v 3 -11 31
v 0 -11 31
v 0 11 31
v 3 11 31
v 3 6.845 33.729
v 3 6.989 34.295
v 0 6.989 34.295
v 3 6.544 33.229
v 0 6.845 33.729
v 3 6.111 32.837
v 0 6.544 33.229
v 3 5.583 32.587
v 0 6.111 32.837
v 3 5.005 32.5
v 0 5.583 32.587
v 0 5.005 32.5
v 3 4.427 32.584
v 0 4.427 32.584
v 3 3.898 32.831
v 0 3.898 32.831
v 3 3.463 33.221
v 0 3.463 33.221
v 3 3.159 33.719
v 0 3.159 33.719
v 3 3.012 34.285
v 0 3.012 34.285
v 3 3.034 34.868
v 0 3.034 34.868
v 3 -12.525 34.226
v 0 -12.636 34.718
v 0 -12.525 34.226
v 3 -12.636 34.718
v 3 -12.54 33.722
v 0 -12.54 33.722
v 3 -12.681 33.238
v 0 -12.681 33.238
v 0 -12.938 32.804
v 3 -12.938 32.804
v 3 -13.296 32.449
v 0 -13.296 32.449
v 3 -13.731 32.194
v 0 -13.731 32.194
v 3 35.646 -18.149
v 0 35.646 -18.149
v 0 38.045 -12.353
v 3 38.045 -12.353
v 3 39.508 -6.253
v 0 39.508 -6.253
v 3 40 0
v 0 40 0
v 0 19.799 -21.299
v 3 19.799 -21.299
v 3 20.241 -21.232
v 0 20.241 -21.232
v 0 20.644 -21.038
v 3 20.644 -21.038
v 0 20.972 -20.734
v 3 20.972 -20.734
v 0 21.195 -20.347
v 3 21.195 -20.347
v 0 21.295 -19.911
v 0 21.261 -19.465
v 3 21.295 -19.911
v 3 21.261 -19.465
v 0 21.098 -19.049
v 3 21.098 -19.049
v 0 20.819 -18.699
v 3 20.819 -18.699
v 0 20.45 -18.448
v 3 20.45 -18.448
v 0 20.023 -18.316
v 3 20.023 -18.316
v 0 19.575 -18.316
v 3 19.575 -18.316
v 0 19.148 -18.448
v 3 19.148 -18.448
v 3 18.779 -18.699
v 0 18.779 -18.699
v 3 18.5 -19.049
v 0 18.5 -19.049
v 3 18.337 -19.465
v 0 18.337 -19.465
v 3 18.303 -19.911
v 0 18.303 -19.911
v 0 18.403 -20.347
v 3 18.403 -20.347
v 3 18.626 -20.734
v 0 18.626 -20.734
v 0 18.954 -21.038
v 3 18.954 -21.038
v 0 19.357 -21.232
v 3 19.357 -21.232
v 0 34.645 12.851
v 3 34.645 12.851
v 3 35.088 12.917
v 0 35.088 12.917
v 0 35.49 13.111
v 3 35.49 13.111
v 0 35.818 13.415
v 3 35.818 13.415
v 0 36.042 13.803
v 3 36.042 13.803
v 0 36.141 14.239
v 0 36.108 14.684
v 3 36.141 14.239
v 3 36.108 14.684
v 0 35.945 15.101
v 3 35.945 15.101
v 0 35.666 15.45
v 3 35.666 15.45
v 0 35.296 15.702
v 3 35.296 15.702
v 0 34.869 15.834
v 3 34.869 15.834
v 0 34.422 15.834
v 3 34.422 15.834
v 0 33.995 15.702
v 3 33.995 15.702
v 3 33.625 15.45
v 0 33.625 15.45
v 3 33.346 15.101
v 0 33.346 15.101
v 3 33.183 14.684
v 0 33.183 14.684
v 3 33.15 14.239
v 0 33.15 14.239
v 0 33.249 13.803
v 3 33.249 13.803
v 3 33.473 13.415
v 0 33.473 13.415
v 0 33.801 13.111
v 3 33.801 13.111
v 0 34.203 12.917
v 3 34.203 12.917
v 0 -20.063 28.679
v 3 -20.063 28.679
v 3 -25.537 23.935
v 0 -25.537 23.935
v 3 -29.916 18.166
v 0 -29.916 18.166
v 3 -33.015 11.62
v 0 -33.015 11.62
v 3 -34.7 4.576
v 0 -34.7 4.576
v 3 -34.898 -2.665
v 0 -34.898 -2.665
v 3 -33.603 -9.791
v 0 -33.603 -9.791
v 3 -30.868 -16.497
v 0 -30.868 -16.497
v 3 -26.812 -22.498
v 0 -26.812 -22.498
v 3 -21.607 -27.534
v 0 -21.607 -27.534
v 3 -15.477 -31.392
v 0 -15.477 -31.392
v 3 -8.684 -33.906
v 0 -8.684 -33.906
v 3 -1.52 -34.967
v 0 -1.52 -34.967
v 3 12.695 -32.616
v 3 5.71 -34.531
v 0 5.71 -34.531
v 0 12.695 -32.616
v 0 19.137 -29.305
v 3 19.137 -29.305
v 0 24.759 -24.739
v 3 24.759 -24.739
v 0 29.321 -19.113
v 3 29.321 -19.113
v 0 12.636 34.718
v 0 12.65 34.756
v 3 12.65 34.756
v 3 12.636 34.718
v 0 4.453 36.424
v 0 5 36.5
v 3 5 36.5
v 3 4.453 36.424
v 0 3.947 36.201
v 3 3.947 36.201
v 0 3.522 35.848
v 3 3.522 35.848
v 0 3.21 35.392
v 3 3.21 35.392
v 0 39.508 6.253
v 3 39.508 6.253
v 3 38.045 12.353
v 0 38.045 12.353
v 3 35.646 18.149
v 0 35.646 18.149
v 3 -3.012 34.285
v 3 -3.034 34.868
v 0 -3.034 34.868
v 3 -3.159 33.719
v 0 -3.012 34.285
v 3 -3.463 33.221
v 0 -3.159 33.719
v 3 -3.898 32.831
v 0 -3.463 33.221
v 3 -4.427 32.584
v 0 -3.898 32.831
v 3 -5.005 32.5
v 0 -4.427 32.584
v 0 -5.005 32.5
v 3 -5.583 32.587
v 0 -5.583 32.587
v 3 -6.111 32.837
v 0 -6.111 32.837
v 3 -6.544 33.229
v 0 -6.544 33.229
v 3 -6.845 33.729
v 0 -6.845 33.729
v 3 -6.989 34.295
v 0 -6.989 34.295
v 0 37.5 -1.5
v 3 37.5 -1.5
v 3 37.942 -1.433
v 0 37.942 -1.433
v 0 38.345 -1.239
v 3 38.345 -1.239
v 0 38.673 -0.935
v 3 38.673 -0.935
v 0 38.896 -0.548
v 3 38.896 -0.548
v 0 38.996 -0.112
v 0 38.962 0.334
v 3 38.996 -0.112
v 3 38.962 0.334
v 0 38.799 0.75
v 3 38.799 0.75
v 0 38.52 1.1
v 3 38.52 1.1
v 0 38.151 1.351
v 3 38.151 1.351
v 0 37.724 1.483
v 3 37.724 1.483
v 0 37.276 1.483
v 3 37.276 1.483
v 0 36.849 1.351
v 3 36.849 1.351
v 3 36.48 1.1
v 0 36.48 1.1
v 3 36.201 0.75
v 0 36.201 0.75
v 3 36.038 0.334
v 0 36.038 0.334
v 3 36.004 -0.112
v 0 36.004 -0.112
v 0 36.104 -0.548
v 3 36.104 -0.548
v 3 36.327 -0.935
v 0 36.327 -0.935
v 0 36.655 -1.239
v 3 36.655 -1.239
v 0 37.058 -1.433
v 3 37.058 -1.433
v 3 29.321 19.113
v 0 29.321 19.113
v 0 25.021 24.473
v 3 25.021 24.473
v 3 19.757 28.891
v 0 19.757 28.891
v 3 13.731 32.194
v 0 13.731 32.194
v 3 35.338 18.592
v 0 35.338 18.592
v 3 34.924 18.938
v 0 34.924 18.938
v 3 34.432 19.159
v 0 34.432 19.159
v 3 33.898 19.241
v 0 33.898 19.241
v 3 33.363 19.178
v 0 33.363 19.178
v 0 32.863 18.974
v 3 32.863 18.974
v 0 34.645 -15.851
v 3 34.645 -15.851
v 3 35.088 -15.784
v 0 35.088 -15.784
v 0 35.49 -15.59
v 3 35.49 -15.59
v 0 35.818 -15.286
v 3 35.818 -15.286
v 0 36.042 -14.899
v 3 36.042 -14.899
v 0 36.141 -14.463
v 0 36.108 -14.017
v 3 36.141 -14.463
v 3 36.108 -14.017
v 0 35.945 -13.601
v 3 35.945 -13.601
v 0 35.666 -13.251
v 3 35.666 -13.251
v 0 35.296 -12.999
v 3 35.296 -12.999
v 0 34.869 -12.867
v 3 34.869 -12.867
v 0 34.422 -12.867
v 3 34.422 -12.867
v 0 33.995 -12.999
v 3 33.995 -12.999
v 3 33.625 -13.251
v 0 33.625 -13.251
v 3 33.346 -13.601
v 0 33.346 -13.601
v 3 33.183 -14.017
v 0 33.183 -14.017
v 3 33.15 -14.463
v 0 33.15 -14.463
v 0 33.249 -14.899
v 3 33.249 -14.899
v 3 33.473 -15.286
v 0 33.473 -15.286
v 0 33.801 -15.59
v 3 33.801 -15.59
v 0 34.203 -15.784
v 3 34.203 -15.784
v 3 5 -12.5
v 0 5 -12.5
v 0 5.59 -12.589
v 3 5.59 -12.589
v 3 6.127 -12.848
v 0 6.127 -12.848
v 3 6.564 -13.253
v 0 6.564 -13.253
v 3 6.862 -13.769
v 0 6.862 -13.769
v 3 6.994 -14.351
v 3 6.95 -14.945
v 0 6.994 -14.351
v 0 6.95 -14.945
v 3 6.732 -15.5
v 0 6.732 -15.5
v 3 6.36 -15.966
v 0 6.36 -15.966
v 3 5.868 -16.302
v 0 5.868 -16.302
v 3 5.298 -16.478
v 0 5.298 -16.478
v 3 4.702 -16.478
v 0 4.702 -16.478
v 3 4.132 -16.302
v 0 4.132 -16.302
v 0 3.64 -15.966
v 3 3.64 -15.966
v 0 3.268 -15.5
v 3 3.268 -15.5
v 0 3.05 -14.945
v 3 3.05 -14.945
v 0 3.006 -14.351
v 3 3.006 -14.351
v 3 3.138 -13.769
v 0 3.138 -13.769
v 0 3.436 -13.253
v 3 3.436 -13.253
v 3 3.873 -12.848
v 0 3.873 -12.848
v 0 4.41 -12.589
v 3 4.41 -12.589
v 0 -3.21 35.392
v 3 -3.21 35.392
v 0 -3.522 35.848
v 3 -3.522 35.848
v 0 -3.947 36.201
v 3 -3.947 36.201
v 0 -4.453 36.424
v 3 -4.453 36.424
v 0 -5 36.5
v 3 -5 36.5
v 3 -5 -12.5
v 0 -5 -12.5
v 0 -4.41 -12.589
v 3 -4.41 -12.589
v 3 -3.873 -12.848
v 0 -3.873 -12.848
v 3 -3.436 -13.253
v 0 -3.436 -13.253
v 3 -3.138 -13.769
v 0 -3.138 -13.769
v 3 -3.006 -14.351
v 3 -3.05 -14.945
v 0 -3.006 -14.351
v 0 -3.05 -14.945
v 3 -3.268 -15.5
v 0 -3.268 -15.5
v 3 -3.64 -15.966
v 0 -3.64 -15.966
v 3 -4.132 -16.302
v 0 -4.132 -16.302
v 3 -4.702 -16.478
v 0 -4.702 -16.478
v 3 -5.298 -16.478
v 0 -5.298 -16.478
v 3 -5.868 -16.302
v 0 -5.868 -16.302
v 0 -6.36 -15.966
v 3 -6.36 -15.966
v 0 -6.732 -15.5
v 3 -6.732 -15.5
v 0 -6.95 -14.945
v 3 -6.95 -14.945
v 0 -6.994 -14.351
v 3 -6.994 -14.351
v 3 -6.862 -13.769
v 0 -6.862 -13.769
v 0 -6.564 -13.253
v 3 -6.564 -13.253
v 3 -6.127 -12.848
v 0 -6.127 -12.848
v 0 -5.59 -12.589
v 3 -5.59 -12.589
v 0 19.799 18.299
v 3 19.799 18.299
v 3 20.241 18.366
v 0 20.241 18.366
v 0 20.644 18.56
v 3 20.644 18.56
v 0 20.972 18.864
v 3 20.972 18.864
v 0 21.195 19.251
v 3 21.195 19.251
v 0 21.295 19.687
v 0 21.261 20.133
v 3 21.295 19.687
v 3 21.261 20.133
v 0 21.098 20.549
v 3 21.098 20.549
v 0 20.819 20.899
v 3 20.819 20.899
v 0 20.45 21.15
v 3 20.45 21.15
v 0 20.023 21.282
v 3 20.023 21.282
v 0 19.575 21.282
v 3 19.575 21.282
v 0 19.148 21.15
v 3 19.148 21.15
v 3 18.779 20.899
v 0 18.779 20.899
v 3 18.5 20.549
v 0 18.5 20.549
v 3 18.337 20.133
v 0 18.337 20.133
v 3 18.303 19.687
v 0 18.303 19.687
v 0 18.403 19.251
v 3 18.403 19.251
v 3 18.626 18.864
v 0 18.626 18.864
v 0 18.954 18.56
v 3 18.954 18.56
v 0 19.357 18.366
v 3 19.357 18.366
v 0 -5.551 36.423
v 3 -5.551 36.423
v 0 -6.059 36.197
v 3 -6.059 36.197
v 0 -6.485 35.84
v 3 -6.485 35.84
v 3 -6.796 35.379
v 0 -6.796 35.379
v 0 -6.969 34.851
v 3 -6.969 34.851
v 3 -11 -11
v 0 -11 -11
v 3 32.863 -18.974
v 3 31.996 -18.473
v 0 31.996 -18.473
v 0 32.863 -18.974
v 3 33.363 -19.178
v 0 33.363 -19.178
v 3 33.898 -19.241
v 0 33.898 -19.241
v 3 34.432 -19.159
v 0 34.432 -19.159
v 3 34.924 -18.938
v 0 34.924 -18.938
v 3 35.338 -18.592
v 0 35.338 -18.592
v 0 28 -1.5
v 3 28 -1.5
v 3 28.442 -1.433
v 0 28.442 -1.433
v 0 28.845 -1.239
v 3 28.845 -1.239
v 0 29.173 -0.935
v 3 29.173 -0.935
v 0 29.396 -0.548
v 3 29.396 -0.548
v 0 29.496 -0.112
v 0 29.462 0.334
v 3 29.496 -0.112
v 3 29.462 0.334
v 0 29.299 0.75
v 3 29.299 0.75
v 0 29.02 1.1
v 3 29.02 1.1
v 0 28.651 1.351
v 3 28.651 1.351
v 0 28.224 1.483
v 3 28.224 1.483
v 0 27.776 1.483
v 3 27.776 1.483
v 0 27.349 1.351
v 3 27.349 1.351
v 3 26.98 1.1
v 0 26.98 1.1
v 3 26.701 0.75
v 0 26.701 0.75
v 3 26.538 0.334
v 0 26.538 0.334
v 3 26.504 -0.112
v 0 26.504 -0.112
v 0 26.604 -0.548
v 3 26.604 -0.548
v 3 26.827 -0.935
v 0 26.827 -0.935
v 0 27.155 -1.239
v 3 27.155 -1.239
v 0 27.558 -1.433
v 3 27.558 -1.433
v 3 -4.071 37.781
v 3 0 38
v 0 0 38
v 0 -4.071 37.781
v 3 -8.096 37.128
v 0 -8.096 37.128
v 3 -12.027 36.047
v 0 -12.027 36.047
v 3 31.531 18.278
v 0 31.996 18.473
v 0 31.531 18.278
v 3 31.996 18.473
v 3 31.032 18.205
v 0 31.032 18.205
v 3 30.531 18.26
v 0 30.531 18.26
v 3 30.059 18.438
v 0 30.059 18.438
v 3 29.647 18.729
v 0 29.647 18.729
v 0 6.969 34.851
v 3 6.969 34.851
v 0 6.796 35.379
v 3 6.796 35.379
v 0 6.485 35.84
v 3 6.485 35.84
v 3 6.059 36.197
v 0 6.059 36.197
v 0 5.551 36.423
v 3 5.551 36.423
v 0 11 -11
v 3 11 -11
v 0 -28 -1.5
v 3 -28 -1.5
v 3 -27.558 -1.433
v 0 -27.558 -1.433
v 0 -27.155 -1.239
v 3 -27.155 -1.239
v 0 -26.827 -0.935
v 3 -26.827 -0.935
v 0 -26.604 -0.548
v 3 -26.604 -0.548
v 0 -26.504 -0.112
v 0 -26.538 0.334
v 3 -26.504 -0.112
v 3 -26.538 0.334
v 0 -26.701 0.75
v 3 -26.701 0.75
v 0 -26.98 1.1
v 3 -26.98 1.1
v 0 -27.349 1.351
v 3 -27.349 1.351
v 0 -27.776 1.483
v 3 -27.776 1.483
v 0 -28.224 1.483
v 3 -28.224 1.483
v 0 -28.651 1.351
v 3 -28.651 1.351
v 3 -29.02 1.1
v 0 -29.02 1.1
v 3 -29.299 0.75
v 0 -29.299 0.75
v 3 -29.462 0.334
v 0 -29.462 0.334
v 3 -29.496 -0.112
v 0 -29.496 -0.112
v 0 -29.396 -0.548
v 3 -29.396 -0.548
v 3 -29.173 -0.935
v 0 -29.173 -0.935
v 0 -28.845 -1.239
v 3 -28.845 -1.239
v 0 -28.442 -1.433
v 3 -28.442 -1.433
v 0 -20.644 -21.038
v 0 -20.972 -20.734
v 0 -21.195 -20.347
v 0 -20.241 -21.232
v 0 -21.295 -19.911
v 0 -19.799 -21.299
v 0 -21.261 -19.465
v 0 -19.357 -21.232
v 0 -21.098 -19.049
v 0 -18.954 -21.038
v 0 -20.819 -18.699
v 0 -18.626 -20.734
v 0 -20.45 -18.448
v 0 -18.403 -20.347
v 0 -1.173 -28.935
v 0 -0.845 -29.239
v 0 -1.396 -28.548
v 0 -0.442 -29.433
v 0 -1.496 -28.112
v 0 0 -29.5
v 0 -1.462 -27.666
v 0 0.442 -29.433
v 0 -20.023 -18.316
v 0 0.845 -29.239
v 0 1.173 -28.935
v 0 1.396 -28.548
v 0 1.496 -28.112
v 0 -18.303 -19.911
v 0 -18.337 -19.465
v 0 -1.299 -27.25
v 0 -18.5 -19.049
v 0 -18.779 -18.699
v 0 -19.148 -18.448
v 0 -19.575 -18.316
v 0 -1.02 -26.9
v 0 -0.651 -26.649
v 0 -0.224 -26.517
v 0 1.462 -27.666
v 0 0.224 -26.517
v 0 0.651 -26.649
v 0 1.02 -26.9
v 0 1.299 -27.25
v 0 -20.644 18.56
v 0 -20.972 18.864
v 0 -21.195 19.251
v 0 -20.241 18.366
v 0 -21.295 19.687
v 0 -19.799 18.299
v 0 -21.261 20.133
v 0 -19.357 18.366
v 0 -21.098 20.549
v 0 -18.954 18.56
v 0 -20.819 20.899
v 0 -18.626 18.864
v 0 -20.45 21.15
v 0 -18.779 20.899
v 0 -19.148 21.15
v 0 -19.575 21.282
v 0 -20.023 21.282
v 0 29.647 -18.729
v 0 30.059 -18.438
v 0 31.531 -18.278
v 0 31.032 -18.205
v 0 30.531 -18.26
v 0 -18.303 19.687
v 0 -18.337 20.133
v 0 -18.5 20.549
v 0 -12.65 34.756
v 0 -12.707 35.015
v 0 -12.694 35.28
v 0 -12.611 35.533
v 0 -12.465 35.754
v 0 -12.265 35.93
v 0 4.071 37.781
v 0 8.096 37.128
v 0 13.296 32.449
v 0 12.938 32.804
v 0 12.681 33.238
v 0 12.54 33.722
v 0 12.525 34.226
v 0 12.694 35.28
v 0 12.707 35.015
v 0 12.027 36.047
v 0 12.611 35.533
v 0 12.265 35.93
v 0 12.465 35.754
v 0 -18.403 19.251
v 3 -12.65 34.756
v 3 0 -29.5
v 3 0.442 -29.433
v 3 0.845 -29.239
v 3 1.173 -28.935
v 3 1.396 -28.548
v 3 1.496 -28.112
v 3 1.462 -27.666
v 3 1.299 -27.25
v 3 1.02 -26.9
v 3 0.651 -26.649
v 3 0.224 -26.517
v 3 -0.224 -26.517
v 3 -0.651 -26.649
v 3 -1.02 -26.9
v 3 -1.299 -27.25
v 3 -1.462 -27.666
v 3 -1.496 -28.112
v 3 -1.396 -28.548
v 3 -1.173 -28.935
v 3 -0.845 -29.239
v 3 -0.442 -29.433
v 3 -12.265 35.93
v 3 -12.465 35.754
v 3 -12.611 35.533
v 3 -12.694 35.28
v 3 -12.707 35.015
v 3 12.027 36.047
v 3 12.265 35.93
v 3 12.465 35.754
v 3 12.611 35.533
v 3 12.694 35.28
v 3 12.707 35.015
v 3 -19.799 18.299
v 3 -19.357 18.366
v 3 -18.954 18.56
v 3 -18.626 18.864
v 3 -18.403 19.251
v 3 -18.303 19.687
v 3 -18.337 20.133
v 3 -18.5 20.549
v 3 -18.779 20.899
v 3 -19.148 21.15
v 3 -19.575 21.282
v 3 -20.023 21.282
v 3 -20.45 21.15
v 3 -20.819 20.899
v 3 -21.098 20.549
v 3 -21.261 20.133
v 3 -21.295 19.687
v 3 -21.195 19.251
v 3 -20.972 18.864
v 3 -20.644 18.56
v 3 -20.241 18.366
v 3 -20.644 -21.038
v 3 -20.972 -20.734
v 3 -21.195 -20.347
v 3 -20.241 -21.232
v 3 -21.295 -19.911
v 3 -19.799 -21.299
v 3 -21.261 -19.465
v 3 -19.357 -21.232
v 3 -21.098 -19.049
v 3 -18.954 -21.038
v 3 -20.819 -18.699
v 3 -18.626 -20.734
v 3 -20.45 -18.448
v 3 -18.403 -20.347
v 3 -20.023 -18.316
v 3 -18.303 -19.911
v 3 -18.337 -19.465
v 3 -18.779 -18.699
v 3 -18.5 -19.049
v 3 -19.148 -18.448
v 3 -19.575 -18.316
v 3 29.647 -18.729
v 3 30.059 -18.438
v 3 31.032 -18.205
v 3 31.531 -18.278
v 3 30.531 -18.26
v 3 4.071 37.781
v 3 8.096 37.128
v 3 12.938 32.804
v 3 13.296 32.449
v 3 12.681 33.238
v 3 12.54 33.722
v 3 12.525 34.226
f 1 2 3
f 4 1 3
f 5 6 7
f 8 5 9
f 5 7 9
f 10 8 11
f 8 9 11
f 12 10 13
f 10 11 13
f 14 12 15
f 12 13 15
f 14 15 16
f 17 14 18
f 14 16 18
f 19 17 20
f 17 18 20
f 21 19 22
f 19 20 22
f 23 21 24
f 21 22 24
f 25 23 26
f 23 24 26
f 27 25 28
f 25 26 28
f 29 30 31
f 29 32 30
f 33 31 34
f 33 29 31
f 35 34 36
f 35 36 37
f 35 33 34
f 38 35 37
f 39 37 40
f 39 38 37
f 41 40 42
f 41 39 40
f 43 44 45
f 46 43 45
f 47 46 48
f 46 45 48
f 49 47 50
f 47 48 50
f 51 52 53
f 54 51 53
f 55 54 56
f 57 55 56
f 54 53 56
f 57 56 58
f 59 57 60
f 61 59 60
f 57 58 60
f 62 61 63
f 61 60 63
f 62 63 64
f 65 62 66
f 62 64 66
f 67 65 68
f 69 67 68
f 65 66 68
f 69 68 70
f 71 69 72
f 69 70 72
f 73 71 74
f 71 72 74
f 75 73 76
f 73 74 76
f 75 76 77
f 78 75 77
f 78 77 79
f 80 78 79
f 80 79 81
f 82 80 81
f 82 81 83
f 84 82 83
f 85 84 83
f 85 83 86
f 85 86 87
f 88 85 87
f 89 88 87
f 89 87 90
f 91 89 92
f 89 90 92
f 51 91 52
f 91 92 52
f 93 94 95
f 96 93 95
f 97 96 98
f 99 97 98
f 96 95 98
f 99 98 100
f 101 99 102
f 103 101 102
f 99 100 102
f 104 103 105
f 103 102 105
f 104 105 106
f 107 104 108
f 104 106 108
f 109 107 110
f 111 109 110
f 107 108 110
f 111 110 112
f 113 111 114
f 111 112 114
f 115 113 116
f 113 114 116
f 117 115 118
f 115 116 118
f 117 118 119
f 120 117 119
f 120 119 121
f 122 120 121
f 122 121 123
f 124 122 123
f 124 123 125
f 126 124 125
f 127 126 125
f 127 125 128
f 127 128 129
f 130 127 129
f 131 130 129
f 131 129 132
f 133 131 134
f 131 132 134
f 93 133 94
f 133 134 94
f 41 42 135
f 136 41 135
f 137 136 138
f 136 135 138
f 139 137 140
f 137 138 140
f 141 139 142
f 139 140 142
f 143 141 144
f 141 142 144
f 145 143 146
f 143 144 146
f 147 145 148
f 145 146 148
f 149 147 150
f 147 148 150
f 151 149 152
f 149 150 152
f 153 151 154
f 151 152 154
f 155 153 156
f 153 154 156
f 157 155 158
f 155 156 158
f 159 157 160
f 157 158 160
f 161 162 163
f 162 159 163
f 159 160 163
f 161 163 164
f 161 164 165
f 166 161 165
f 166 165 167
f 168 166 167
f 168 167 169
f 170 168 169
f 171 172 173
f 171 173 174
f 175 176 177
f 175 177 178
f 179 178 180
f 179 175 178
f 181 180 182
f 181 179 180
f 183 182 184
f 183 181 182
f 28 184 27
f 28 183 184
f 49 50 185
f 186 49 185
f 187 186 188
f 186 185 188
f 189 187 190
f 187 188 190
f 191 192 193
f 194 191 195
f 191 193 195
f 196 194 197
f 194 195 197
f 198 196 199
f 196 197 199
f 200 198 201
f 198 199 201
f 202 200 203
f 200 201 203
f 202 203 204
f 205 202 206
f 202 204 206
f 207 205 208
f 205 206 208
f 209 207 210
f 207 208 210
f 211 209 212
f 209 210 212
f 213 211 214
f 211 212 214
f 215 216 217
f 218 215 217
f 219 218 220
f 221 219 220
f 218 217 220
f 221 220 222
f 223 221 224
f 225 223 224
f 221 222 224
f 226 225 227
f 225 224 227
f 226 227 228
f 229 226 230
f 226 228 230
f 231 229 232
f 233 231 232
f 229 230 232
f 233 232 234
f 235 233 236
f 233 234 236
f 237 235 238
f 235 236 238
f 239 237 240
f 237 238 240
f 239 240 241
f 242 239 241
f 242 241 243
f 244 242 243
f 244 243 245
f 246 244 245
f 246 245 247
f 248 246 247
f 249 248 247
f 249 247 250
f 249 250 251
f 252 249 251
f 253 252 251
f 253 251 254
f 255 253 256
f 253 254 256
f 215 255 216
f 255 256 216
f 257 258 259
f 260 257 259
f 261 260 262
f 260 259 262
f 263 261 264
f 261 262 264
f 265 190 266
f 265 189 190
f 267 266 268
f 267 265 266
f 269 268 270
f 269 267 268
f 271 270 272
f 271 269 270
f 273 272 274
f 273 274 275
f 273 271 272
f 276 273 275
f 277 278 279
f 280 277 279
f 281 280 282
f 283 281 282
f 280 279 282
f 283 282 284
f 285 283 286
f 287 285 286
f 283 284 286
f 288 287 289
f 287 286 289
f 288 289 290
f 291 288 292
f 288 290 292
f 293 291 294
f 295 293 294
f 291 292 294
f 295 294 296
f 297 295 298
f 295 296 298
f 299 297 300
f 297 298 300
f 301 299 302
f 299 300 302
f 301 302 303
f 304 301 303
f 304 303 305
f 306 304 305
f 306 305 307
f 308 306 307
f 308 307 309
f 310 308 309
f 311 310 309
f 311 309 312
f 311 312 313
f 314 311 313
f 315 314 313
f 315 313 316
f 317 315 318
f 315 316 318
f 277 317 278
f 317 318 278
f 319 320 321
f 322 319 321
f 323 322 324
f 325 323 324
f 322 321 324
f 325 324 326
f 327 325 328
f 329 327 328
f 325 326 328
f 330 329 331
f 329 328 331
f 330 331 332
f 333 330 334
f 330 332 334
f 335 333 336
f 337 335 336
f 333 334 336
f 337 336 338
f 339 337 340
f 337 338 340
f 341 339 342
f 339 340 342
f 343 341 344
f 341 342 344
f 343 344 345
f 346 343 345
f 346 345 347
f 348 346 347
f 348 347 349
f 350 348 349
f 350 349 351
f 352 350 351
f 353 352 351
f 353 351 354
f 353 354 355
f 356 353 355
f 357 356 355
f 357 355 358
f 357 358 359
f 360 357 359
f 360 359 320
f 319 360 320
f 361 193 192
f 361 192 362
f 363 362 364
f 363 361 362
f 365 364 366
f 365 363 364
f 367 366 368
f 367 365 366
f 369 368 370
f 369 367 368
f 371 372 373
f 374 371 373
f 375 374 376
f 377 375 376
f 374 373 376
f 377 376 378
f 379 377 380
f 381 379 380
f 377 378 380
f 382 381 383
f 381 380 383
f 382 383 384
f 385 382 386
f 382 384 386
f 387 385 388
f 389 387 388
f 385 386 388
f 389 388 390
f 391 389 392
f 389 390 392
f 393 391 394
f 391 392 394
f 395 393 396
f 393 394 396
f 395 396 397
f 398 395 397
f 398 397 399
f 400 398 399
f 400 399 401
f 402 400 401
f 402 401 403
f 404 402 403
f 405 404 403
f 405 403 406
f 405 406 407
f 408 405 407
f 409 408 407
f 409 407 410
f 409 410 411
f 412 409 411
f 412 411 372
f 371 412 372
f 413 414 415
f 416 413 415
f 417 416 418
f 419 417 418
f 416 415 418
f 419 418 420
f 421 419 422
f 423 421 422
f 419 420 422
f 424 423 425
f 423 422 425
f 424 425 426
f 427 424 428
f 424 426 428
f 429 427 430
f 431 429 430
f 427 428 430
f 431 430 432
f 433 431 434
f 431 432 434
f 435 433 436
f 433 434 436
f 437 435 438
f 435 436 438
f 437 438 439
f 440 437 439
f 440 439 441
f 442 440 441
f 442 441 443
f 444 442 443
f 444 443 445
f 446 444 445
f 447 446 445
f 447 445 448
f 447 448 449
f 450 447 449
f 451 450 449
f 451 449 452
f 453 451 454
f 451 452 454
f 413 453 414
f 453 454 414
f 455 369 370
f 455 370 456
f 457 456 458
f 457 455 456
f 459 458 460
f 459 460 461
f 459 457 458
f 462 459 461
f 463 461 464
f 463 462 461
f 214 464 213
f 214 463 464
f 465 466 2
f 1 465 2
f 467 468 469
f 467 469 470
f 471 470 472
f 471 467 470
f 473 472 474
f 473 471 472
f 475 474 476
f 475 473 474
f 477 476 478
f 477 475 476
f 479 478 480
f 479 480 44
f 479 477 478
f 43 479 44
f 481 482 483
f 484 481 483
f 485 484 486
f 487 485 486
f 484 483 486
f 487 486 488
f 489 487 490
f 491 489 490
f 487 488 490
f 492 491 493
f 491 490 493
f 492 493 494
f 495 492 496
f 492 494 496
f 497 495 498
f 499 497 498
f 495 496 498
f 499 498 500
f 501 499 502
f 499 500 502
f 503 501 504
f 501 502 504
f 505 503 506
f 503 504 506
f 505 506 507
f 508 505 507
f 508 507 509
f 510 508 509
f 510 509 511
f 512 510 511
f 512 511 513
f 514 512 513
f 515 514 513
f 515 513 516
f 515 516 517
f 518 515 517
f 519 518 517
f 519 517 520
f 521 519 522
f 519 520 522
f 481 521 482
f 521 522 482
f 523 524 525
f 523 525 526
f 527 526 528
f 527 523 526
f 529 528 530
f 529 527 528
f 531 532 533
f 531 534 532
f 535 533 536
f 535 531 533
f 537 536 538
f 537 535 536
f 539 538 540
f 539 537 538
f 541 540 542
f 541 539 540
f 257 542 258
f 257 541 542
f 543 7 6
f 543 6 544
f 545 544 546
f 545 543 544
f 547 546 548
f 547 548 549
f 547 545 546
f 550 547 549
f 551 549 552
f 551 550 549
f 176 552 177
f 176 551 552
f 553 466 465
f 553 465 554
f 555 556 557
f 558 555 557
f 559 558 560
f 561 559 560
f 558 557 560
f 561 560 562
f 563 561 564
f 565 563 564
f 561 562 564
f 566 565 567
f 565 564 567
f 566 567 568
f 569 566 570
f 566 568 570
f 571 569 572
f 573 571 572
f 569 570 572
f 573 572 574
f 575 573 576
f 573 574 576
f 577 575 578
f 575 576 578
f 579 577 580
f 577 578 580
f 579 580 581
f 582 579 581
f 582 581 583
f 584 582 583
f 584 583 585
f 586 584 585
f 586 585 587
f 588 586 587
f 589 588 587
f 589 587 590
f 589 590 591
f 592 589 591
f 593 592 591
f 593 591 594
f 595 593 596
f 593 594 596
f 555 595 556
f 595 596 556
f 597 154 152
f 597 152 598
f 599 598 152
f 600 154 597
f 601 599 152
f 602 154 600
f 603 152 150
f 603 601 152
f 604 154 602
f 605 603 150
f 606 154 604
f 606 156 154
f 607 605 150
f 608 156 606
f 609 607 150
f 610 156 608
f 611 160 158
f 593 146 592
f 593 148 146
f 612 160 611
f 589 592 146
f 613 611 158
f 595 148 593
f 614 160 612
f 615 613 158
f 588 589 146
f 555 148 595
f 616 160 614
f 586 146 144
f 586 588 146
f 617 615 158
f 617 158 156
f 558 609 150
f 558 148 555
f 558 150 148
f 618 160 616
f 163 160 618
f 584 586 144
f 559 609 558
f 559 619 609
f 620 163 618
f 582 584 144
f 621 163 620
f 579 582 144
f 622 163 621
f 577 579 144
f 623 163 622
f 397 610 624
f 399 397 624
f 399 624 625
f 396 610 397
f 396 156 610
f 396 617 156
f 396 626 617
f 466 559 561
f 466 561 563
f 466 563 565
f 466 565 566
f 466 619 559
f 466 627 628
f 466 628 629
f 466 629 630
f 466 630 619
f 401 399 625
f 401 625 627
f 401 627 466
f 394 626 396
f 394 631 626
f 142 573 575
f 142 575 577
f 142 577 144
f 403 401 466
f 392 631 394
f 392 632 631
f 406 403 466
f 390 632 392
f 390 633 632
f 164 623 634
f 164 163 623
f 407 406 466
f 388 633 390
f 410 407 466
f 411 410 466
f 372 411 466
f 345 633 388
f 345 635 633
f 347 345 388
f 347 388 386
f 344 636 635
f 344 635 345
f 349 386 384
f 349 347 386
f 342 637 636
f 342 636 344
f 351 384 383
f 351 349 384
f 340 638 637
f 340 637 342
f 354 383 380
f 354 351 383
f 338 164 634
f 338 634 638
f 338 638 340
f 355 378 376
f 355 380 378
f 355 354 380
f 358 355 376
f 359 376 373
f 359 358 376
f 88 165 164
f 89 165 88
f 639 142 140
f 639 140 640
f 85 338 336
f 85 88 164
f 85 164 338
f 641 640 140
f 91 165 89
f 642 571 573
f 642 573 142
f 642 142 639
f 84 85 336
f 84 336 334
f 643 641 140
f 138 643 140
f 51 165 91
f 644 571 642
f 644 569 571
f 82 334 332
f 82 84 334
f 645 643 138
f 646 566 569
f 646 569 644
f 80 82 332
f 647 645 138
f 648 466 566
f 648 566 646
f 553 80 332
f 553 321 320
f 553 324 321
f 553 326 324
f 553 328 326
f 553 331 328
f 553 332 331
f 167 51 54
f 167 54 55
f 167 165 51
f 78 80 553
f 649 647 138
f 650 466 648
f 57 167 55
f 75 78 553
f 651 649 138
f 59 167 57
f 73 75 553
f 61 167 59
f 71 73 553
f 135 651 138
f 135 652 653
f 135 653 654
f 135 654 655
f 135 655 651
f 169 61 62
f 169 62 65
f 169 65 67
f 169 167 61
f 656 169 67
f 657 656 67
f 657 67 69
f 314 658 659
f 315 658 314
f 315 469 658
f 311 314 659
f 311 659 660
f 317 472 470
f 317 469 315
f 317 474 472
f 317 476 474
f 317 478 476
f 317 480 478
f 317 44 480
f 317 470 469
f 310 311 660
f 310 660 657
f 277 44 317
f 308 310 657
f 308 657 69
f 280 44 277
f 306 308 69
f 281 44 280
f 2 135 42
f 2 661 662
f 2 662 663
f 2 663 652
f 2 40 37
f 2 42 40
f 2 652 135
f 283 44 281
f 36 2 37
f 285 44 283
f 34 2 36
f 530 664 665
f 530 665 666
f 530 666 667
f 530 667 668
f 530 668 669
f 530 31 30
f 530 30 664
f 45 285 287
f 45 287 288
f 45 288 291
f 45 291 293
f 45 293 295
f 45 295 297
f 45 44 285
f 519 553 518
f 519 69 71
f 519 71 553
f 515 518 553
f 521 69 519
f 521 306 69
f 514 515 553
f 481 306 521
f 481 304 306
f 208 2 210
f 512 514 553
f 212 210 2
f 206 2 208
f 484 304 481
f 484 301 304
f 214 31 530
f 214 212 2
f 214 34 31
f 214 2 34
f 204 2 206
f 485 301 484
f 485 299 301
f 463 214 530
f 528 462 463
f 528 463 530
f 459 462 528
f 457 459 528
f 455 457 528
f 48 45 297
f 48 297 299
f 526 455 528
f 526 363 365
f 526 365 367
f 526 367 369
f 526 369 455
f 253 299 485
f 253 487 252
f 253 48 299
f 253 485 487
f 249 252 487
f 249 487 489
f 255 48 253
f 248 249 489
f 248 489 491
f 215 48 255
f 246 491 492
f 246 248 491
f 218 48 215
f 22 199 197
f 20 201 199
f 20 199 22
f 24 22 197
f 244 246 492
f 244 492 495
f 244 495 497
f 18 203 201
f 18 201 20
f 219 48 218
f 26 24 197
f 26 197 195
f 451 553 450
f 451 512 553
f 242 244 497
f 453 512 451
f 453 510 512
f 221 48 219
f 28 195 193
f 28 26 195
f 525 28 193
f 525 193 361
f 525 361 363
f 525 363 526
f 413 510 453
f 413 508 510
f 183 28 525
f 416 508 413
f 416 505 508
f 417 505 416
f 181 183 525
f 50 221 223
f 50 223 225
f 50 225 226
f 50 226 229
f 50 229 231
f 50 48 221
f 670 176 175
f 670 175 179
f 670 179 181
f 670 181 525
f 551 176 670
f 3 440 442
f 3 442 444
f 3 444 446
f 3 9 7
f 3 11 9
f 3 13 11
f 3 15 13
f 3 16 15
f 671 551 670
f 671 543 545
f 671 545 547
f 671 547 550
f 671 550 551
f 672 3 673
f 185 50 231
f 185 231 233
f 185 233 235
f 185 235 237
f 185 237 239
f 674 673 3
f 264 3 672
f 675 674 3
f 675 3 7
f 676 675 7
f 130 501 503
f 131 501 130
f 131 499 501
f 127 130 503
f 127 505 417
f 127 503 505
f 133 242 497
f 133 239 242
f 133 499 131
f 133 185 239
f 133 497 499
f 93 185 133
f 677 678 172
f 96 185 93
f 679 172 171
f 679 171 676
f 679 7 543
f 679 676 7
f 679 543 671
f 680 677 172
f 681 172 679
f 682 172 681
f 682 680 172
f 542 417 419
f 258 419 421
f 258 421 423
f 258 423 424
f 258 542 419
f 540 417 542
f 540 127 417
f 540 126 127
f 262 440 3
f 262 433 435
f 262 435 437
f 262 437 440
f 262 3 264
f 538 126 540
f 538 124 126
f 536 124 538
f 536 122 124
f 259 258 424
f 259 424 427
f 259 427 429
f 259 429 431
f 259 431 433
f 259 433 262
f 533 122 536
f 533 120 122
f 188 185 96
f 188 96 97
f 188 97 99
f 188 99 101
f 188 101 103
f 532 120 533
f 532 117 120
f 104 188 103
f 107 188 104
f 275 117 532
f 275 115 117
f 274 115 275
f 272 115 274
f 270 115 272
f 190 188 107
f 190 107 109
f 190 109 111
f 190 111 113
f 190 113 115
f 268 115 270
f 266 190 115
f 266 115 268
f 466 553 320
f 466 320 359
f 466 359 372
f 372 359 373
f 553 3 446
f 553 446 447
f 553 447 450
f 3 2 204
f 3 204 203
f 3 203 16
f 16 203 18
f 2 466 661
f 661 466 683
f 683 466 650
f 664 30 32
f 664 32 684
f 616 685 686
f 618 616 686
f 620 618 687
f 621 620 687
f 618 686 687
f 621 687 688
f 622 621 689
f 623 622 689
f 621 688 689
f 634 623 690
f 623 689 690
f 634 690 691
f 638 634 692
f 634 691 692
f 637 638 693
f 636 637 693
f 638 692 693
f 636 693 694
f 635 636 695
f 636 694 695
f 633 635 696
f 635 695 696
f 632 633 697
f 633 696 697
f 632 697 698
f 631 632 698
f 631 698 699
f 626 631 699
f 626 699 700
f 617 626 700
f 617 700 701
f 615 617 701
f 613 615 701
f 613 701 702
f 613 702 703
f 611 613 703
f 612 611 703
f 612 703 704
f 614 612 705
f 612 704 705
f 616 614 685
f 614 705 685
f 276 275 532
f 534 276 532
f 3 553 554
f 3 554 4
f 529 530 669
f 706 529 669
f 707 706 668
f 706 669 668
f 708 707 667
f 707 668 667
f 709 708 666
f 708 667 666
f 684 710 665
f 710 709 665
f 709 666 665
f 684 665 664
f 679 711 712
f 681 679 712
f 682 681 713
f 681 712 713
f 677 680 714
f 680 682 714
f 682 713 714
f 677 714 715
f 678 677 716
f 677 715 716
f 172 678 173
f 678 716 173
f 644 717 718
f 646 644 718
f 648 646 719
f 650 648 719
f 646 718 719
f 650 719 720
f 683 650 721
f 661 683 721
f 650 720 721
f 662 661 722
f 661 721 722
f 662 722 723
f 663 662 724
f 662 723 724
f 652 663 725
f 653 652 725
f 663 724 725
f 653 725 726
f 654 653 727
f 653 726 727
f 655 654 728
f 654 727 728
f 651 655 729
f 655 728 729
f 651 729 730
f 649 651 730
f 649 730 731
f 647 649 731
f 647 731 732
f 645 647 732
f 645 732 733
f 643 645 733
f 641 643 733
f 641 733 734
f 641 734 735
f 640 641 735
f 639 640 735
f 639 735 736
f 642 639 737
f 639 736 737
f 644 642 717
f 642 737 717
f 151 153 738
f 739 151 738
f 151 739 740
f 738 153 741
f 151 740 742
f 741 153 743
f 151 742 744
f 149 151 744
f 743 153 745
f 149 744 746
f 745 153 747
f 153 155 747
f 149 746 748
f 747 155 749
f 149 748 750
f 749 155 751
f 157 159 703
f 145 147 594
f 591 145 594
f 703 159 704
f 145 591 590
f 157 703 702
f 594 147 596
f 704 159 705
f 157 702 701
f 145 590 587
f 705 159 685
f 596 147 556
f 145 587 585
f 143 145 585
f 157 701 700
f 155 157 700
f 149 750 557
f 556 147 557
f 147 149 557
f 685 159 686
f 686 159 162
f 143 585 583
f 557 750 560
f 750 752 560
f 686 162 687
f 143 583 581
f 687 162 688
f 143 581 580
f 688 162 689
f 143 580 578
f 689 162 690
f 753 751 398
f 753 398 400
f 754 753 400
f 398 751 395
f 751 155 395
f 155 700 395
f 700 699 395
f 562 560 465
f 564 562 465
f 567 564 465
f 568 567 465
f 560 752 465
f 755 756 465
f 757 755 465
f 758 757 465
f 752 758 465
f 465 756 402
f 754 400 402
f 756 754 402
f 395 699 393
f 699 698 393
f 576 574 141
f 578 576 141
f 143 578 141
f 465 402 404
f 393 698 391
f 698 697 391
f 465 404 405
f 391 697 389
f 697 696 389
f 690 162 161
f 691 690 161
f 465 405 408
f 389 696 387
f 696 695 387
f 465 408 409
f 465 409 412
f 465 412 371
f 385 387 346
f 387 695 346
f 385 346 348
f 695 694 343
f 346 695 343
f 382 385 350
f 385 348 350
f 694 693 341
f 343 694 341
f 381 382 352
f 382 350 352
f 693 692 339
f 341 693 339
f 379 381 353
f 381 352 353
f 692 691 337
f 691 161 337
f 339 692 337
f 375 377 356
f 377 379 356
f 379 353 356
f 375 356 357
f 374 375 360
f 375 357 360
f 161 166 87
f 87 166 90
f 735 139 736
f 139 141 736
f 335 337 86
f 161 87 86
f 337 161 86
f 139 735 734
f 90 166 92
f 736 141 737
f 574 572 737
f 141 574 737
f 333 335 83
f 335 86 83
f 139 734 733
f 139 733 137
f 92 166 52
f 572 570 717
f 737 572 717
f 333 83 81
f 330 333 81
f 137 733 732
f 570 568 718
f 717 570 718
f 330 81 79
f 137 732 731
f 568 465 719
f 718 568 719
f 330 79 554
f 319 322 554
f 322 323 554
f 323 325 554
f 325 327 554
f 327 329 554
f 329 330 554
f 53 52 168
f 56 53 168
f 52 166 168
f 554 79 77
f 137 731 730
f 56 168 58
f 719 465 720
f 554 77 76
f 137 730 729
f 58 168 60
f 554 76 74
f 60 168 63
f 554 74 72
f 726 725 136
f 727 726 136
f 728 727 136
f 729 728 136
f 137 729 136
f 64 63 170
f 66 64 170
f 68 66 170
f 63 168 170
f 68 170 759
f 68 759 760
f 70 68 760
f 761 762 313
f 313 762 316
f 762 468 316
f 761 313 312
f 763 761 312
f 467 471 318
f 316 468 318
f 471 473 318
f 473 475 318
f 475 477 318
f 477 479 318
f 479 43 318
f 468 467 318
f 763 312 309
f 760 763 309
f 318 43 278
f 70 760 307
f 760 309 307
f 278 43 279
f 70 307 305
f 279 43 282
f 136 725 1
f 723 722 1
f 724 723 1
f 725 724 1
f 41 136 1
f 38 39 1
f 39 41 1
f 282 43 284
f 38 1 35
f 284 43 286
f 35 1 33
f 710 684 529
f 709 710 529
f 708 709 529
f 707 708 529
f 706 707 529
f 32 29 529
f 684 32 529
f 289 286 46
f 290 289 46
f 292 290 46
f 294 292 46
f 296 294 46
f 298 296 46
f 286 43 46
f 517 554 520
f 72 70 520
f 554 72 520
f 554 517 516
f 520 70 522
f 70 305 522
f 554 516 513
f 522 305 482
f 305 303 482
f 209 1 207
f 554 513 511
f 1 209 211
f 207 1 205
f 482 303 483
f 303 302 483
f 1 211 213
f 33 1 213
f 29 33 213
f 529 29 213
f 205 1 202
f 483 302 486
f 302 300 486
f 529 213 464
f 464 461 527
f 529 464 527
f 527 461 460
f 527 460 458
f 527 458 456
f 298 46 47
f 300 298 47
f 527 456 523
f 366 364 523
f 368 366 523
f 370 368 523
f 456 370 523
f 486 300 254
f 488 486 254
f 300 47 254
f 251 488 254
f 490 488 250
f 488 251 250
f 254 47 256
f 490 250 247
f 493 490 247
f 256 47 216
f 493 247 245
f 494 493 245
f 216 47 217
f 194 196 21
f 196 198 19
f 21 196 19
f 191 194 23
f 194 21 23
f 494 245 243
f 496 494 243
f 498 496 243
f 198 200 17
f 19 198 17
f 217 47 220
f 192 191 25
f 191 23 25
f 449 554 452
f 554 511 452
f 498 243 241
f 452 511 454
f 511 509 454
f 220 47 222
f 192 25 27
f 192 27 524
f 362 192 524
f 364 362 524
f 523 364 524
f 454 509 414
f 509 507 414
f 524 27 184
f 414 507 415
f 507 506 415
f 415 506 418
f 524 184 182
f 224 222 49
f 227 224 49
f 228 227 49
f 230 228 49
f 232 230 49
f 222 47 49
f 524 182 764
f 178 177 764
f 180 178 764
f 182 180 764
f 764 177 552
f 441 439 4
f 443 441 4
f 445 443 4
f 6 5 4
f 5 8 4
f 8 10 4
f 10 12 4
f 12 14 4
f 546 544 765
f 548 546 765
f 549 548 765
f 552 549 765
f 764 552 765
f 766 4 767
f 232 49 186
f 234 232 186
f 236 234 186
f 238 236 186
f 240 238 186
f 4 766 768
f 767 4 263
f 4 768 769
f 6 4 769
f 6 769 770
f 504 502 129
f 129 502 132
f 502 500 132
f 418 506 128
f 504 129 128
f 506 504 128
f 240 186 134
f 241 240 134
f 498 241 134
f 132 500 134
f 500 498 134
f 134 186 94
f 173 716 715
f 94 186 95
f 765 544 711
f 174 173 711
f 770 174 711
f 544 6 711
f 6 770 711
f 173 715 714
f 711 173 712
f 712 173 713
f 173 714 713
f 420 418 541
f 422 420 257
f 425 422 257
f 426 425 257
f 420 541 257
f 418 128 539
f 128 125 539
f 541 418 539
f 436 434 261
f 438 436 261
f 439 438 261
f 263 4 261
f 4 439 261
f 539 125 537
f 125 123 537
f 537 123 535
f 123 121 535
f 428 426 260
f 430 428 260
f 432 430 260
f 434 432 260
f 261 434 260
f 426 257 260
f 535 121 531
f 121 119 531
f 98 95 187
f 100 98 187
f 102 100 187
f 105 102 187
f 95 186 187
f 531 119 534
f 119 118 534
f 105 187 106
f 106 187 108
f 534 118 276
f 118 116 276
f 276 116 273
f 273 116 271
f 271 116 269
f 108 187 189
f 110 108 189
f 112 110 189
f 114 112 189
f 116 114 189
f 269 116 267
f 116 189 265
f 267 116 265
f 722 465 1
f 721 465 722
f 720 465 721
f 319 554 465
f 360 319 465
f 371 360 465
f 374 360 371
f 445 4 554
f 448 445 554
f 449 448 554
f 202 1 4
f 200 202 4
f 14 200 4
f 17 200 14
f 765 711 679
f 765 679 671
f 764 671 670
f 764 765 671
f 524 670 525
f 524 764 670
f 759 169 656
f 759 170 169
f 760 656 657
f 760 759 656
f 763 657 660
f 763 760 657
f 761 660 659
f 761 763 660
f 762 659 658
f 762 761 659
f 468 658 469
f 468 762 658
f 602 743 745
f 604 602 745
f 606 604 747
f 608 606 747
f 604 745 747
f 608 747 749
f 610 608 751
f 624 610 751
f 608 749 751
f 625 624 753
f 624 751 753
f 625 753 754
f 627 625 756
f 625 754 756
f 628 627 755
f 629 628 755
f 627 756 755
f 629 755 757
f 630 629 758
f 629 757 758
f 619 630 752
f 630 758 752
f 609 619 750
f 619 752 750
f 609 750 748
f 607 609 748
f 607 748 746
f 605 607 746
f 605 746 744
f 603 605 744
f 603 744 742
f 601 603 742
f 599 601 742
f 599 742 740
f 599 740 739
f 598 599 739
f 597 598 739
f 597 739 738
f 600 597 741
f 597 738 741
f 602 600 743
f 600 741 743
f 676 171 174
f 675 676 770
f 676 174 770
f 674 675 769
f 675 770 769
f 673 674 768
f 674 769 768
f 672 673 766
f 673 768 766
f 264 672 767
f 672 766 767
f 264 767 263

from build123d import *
from build123d.topology import SkipClean

# Parameters (mm, degrees)
SKETCH_1_R               = 35
EXTRUDE_1_DEPTH          = 3
SKETCH_2_R               = 1.5
CUT_EXTRUDE_1_DEPTH      = 3
SKETCH_3_R               = 1.5
CUT_EXTRUDE_2_DEPTH      = 3
SKETCH_4_R               = 12.5
CUT_EXTRUDE_3_DEPTH      = 3
EXTRUDE_START            = -3
EXTRUDE_4_DEPTH          = 3
FILLET_1_R               = 2
FILLET_2_R               = 2
FILLET_3_R               = 2
FILLET_4_R               = 2
SKETCH_6_R               = 1.5
CUT_EXTRUDE_4_DEPTH      = 3
SKETCH_7_R               = 2
CUT_EXTRUDE_5_DEPTH      = 8
EXTRUDE_7_DEPTH          = 3
SKETCH_10_W              = 42
SKETCH_10_H              = 22
CUT_EXTRUDE_6_DEPTH      = 3
SKETCH_11_R              = 12.5
SKETCH_11_R_2            = 1.5
EXTRUDE_9_DEPTH          = 3
SKETCH_12_W              = 42
SKETCH_12_H              = 22
CUT_EXTRUDE_7_DEPTH      = 3
EXTRUDE_11_DEPTH         = 3
SKETCH_14_R              = 1.5
EXTRUDE_12_DEPTH         = 3
FILLET_5_R               = 2
FILLET_6_R               = 2
FILLET_7_R               = 2
FILLET_8_R               = 2
CUT_EXTRUDE_8_DEPTH      = 57.648036153
CUT_EXTRUDE_8_DEPTH_BACK = 57.648036153
FILLET_9_R               = 1
FILLET_10_R              = 1


with BuildPart() as part:
    # 草图1 → 凸台-拉伸1 (new body)
    with BuildSketch(Plane(origin=(0, 0, 0), x_dir=(0, 0, -1), z_dir=(1, 0, 0))):
        Circle(SKETCH_1_R)
    extrude(amount=EXTRUDE_1_DEPTH)

    # 草图2 → 切除-拉伸1 (cut)
    with BuildSketch(Plane(origin=(3, 0, 0), x_dir=(0, 0, -1), z_dir=(1, 0, 0))):
        with Locations((0, 28)):
            Circle(SKETCH_2_R)
        with Locations((19.798989873, 19.798989873)):
            Circle(SKETCH_2_R)
        with Locations((28, 0)):
            Circle(SKETCH_2_R)
        with Locations((19.798989873, -19.798989873)):
            Circle(SKETCH_2_R)
        with Locations((0, -28)):
            Circle(SKETCH_2_R)
        with Locations((-19.798989873, -19.798989873)):
            Circle(SKETCH_2_R)
        with Locations((-28, 0)):
            Circle(SKETCH_2_R)
        with Locations((-19.798989873, 19.798989873)):
            Circle(SKETCH_2_R)
    extrude(amount=-CUT_EXTRUDE_1_DEPTH, mode=Mode.SUBTRACT)

    # 草图3 → 切除-拉伸2 (cut)
    with BuildSketch(Plane(origin=(3, 0, 0), x_dir=(0, 0, -1), z_dir=(1, 0, 0))):
        with Locations((0, 17.5)):
            Circle(SKETCH_3_R)
        with Locations((12.374368671, 12.374368671)):
            Circle(SKETCH_3_R)
        with Locations((17.5, 0)):
            Circle(SKETCH_3_R)
        with Locations((12.374368671, -12.374368671)):
            Circle(SKETCH_3_R)
        with Locations((0, -17.5)):
            Circle(SKETCH_3_R)
        with Locations((-12.374368671, -12.374368671)):
            Circle(SKETCH_3_R)
        with Locations((-17.5, 0)):
            Circle(SKETCH_3_R)
        with Locations((-12.374368671, 12.374368671)):
            Circle(SKETCH_3_R)
    extrude(amount=-CUT_EXTRUDE_2_DEPTH, mode=Mode.SUBTRACT)

    # 草图4 → 切除-拉伸3 (cut)
    with BuildSketch(Plane.ZY):
        Circle(SKETCH_4_R)
    extrude(amount=-CUT_EXTRUDE_3_DEPTH, mode=Mode.SUBTRACT)

    # 草图5 → 凸台-拉伸4 (add)
    with BuildSketch(Plane(origin=(3, 0, 0), x_dir=(0, 0, -1), z_dir=(1, 0, 0)).offset(EXTRUDE_START)):
        with BuildLine():
            Line((-20, 34.641016151), (-17.5, 30.310889132))
            ThreePointArc((-17.5, 30.310889132), (-9.058666579, 33.80740392), (0, 35))
            Line((0, 35), (0, 40))
            ThreePointArc((0, 40), (-10.352761804, 38.637033052), (-20, 34.641016151))
        make_face()
        with BuildLine():
            ThreePointArc((0, 35), (9.058666579, 33.80740392), (17.5, 30.310889132))
            Line((17.5, 30.310889132), (20, 34.641016151))
            ThreePointArc((20, 34.641016151), (10.352761804, 38.637033052), (0, 40))
            Line((0, 40), (0, 35))
        make_face()
    extrude(amount=EXTRUDE_4_DEPTH)

    # 圆角1
    fillet_1_edges = [part.edges().sort_by_distance(p)[0] for p in [
        (1.5, 34.641016151, 20),
    ]]
    fillet(fillet_1_edges, radius=FILLET_1_R)

    # 圆角2
    fillet_2_edges = [part.edges().sort_by_distance(p)[0] for p in [
        (1.5, 30.310889132, 17.5),
    ]]
    fillet(fillet_2_edges, radius=FILLET_2_R)

    # 圆角3
    fillet_3_edges = [part.edges().sort_by_distance(p)[0] for p in [
        (1.5, 30.310889132, -17.5),
    ]]
    fillet(fillet_3_edges, radius=FILLET_3_R)

    # 圆角4
    fillet_4_edges = [part.edges().sort_by_distance(p)[0] for p in [
        (1.5, 34.641016151, -20),
    ]]
    fillet(fillet_4_edges, radius=FILLET_4_R)

    # 草图6 → 切除-拉伸4 (cut)
    with BuildSketch(Plane(origin=(3, 0, 0), x_dir=(0, 0, -1), z_dir=(1, 0, 0))):
        with Locations((0, 37.5)):
            Circle(SKETCH_6_R)
        with Locations((14.350628714, 34.645482469)):
            Circle(SKETCH_6_R)
        with Locations((-14.350628714, 34.645482469)):
            Circle(SKETCH_6_R)
    extrude(amount=-CUT_EXTRUDE_4_DEPTH, mode=Mode.SUBTRACT)

    # 草图7 → 切除-拉伸5 (cut)
    with BuildSketch(Plane.ZY):
        with Locations((-14.5, 5)):
            Circle(SKETCH_7_R)
        with Locations((-14.5, -5)):
            Circle(SKETCH_7_R)
        with Locations((34.5, -5)):
            Circle(SKETCH_7_R)
        with Locations((34.5, 5)):
            Circle(SKETCH_7_R)
    extrude(amount=-CUT_EXTRUDE_5_DEPTH, mode=Mode.SUBTRACT)

    # 草图8 → 凸台-拉伸7 (add)
    with SkipClean():  # the faces are left unmerged after this step: merging them gives an invalid solid
        with BuildSketch(Plane.ZY):
            with BuildLine():
                Line((37.587704831, 13.680805733), (32.889241728, 11.970705016))
                ThreePointArc((32.889241728, 11.970705016), (33.684327683, 9.506106909), (34.295004854, 6.989466509))
                ThreePointArc((34.295004854, 6.989466509), (35.839777912, 6.484922606), (36.5, 5))
                ThreePointArc((36.5, 5), (36.038906483, 3.722593707), (34.868233163, 3.034191175))
                ThreePointArc((34.868233163, 3.034191175), (35, 0), (34.868233163, -3.034191175))
                ThreePointArc((34.868233163, -3.034191175), (36.038906483, -3.722593707), (36.5, -5))
                ThreePointArc((36.5, -5), (35.839777912, -6.484922606), (34.295004854, -6.989466509))
                ThreePointArc((34.295004854, -6.989466509), (33.684327683, -9.506106909), (32.889241728, -11.970705016))
                Line((32.889241728, -11.970705016), (37.587704831, -13.680805733))
                ThreePointArc((37.587704831, -13.680805733), (39.39231012, -6.945927107), (40, 0))
                ThreePointArc((40, 0), (39.39231012, 6.945927107), (37.587704831, 13.680805733))
            make_face()
        extrude(amount=-EXTRUDE_7_DEPTH)

    # 草图10 → 切除-拉伸6 (cut)
    with SkipClean():  # the faces are left unmerged after this step: merging them gives an invalid solid
        with BuildSketch(Plane.ZY):
            with Locations((10, 0)):
                Rectangle(SKETCH_10_W, SKETCH_10_H)
        extrude(amount=-CUT_EXTRUDE_6_DEPTH, mode=Mode.SUBTRACT)

    # 草图11 → 凸台-拉伸9 (add)
    with SkipClean():  # the faces are left unmerged after this step: merging them gives an invalid solid
        with BuildSketch(Plane.ZY):
            Circle(SKETCH_11_R)
            with Locations((-17.5, 0)):
                Circle(SKETCH_11_R_2)
        extrude(amount=-EXTRUDE_9_DEPTH)

    # 草图12 → 切除-拉伸7 (cut)
    with SkipClean():  # the faces are left unmerged after this step: merging them gives an invalid solid
        with BuildSketch(Plane.ZY):
            with Locations((10, 0)):
                Rectangle(SKETCH_12_W, SKETCH_12_H)
        extrude(amount=-CUT_EXTRUDE_7_DEPTH, mode=Mode.SUBTRACT)

    # 草图13 → 凸台-拉伸11 (add)
    with SkipClean():  # the faces are left unmerged after this step: merging them gives an invalid solid
        with BuildSketch(Plane.ZY.offset(EXTRUDE_START)):
            with BuildLine():
                ThreePointArc((13.874368671, 12.374368671), (11.553207108, 13.629635052), (11.773443753, 11))
                Line((11.773443753, 11), (12.975293589, 11))
                ThreePointArc((12.975293589, 11), (13.629635052, 11.553207108), (13.874368671, 12.374368671))
            make_face()
            with BuildLine():
                Line((12.975293589, -11), (11.773443753, -11))
                ThreePointArc((11.773443753, -11), (11.553207108, -13.629635052), (13.874368671, -12.374368671))
                ThreePointArc((13.874368671, -12.374368671), (13.629635052, -11.553207108), (12.975293589, -11))
            make_face()
        extrude(amount=EXTRUDE_11_DEPTH)

    # 草图14 → 凸台-拉伸12 (add)
    with SkipClean():  # the faces are left unmerged after this step: merging them gives an invalid solid
        with BuildSketch(Plane.ZY.offset(EXTRUDE_START)):
            with Locations((-12.374368671, 12.374368671)):
                Circle(SKETCH_14_R)
            with Locations((0, 17.5)):
                Circle(SKETCH_14_R)
            with Locations((-12.374368671, -12.374368671)):
                Circle(SKETCH_14_R)
            with Locations((0, -17.5)):
                Circle(SKETCH_14_R)
        extrude(amount=EXTRUDE_12_DEPTH)

    # 圆角5
    fillet_5_edges = [part.edges().sort_by_distance(p)[0] for p in [
        (1.5, 13.680805733, 37.587704831),
    ]]
    fillet(fillet_5_edges, radius=FILLET_5_R)

    # 圆角6
    fillet_6_edges = [part.edges().sort_by_distance(p)[0] for p in [
        (1.5, -11.970705016, 32.889241728),
    ]]
    fillet(fillet_6_edges, radius=FILLET_6_R)

    # 圆角7
    fillet_7_edges = [part.edges().sort_by_distance(p)[0] for p in [
        (1.5, 11.970705016, 32.889241728),
    ]]
    fillet(fillet_7_edges, radius=FILLET_7_R)

    # 圆角8
    fillet_8_edges = [part.edges().sort_by_distance(p)[0] for p in [
        (1.5, -13.680805733, 37.587704831),
    ]]
    fillet(fillet_8_edges, radius=FILLET_8_R)

    # 草图15 → 切除-拉伸8 (cut, two sides: drawn at the far end of the back side and taken through both)
    with SkipClean():  # the faces are left unmerged after this step: merging them gives an invalid solid
        with BuildSketch(Plane.ZY.offset(-CUT_EXTRUDE_8_DEPTH_BACK)):
            with BuildLine():
                ThreePointArc((38.255650602, 11.683543854), (37.259018757, 12.877193403), (35.70855681, 12.996113672))
                ThreePointArc((35.70855681, 12.996113672), (37.422754834, 6.598289219), (38, 0))
                ThreePointArc((38, 0), (37.422754834, -6.598289219), (35.70855681, -12.996113672))
                ThreePointArc((35.70855681, -12.996113672), (37.259018757, -12.877193403), (38.255650602, -11.683543854))
                ThreePointArc((38.255650602, -11.683543854), (39.561509224, -5.906520799), (40, 0))
                ThreePointArc((40, 0), (39.561509224, 5.906520799), (38.255650602, 11.683543854))
            make_face()
        extrude(amount=CUT_EXTRUDE_8_DEPTH + CUT_EXTRUDE_8_DEPTH_BACK, mode=Mode.SUBTRACT)

    # 圆角9
    # the kernel refuses this fillet: 1 mm, written as the material it takes off along each edge
    with BuildSketch(Plane(origin=(5.566068235, 12.996113672, 35.70855681), x_dir=(0, -0.3413769828349391, -0.9399264628631933), z_dir=(-1, 0, 0))) as fillet_9_piece_1:
        with BuildLine():
            CenterArc((1.012831861, 0.999999766), FILLET_9_R, 178.49048731, 91.548723167)
            Line((0.013178896, 1.026342685), (-0.0867864, 1.028976977))
            ThreePointArc((-0.0867864, 1.028976977), (-0.096867816, 0.5144998), (-0.099999978, -6.661e-05))
            Line((-0.099999978, -6.661e-05), (-0.002564992, -0.099967099))
            ThreePointArc((-0.002564992, -0.099967099), (0.052736969, -0.100657535), (1.013584648, -0.099999977))
            Line((1.013584648, -0.099999977), (1.013516213, 0))
        make_face()
    extrude(amount=8.132136469, mode=Mode.SUBTRACT)

    # 圆角10
    # the kernel refuses this fillet: 1 mm, written as the material it takes off along each edge
    with BuildSketch(Plane(origin=(-2.566068235, -12.996113672, 35.70855681), x_dir=(0, 0.9442321213290604, 0.3292805810405803), z_dir=(1, 0, 0))) as fillet_10_piece_1:
        with BuildLine():
            CenterArc((1.012921672, -0.999908795), FILLET_10_R, 89.226161317, 91.548723167)
            Line((0.013013123, -1.013432668), (-0.086977731, -1.014785056))
            ThreePointArc((-0.086977731, -1.014785056), (-0.099972117, -0.054025023), (-0.099991792, 0.001281244))
            Line((-0.099991792, 0.001281244), (-0.001350562, 0.099990879))
            ThreePointArc((-0.001350562, 0.099990879), (0.513213647, 0.103465793), (1.027777856, 0.099990879))
            Line((1.027777856, 0.099990879), (1.026427294, 0))
        make_face()
    extrude(amount=8.132136469, mode=Mode.SUBTRACT)


solid = part.part
